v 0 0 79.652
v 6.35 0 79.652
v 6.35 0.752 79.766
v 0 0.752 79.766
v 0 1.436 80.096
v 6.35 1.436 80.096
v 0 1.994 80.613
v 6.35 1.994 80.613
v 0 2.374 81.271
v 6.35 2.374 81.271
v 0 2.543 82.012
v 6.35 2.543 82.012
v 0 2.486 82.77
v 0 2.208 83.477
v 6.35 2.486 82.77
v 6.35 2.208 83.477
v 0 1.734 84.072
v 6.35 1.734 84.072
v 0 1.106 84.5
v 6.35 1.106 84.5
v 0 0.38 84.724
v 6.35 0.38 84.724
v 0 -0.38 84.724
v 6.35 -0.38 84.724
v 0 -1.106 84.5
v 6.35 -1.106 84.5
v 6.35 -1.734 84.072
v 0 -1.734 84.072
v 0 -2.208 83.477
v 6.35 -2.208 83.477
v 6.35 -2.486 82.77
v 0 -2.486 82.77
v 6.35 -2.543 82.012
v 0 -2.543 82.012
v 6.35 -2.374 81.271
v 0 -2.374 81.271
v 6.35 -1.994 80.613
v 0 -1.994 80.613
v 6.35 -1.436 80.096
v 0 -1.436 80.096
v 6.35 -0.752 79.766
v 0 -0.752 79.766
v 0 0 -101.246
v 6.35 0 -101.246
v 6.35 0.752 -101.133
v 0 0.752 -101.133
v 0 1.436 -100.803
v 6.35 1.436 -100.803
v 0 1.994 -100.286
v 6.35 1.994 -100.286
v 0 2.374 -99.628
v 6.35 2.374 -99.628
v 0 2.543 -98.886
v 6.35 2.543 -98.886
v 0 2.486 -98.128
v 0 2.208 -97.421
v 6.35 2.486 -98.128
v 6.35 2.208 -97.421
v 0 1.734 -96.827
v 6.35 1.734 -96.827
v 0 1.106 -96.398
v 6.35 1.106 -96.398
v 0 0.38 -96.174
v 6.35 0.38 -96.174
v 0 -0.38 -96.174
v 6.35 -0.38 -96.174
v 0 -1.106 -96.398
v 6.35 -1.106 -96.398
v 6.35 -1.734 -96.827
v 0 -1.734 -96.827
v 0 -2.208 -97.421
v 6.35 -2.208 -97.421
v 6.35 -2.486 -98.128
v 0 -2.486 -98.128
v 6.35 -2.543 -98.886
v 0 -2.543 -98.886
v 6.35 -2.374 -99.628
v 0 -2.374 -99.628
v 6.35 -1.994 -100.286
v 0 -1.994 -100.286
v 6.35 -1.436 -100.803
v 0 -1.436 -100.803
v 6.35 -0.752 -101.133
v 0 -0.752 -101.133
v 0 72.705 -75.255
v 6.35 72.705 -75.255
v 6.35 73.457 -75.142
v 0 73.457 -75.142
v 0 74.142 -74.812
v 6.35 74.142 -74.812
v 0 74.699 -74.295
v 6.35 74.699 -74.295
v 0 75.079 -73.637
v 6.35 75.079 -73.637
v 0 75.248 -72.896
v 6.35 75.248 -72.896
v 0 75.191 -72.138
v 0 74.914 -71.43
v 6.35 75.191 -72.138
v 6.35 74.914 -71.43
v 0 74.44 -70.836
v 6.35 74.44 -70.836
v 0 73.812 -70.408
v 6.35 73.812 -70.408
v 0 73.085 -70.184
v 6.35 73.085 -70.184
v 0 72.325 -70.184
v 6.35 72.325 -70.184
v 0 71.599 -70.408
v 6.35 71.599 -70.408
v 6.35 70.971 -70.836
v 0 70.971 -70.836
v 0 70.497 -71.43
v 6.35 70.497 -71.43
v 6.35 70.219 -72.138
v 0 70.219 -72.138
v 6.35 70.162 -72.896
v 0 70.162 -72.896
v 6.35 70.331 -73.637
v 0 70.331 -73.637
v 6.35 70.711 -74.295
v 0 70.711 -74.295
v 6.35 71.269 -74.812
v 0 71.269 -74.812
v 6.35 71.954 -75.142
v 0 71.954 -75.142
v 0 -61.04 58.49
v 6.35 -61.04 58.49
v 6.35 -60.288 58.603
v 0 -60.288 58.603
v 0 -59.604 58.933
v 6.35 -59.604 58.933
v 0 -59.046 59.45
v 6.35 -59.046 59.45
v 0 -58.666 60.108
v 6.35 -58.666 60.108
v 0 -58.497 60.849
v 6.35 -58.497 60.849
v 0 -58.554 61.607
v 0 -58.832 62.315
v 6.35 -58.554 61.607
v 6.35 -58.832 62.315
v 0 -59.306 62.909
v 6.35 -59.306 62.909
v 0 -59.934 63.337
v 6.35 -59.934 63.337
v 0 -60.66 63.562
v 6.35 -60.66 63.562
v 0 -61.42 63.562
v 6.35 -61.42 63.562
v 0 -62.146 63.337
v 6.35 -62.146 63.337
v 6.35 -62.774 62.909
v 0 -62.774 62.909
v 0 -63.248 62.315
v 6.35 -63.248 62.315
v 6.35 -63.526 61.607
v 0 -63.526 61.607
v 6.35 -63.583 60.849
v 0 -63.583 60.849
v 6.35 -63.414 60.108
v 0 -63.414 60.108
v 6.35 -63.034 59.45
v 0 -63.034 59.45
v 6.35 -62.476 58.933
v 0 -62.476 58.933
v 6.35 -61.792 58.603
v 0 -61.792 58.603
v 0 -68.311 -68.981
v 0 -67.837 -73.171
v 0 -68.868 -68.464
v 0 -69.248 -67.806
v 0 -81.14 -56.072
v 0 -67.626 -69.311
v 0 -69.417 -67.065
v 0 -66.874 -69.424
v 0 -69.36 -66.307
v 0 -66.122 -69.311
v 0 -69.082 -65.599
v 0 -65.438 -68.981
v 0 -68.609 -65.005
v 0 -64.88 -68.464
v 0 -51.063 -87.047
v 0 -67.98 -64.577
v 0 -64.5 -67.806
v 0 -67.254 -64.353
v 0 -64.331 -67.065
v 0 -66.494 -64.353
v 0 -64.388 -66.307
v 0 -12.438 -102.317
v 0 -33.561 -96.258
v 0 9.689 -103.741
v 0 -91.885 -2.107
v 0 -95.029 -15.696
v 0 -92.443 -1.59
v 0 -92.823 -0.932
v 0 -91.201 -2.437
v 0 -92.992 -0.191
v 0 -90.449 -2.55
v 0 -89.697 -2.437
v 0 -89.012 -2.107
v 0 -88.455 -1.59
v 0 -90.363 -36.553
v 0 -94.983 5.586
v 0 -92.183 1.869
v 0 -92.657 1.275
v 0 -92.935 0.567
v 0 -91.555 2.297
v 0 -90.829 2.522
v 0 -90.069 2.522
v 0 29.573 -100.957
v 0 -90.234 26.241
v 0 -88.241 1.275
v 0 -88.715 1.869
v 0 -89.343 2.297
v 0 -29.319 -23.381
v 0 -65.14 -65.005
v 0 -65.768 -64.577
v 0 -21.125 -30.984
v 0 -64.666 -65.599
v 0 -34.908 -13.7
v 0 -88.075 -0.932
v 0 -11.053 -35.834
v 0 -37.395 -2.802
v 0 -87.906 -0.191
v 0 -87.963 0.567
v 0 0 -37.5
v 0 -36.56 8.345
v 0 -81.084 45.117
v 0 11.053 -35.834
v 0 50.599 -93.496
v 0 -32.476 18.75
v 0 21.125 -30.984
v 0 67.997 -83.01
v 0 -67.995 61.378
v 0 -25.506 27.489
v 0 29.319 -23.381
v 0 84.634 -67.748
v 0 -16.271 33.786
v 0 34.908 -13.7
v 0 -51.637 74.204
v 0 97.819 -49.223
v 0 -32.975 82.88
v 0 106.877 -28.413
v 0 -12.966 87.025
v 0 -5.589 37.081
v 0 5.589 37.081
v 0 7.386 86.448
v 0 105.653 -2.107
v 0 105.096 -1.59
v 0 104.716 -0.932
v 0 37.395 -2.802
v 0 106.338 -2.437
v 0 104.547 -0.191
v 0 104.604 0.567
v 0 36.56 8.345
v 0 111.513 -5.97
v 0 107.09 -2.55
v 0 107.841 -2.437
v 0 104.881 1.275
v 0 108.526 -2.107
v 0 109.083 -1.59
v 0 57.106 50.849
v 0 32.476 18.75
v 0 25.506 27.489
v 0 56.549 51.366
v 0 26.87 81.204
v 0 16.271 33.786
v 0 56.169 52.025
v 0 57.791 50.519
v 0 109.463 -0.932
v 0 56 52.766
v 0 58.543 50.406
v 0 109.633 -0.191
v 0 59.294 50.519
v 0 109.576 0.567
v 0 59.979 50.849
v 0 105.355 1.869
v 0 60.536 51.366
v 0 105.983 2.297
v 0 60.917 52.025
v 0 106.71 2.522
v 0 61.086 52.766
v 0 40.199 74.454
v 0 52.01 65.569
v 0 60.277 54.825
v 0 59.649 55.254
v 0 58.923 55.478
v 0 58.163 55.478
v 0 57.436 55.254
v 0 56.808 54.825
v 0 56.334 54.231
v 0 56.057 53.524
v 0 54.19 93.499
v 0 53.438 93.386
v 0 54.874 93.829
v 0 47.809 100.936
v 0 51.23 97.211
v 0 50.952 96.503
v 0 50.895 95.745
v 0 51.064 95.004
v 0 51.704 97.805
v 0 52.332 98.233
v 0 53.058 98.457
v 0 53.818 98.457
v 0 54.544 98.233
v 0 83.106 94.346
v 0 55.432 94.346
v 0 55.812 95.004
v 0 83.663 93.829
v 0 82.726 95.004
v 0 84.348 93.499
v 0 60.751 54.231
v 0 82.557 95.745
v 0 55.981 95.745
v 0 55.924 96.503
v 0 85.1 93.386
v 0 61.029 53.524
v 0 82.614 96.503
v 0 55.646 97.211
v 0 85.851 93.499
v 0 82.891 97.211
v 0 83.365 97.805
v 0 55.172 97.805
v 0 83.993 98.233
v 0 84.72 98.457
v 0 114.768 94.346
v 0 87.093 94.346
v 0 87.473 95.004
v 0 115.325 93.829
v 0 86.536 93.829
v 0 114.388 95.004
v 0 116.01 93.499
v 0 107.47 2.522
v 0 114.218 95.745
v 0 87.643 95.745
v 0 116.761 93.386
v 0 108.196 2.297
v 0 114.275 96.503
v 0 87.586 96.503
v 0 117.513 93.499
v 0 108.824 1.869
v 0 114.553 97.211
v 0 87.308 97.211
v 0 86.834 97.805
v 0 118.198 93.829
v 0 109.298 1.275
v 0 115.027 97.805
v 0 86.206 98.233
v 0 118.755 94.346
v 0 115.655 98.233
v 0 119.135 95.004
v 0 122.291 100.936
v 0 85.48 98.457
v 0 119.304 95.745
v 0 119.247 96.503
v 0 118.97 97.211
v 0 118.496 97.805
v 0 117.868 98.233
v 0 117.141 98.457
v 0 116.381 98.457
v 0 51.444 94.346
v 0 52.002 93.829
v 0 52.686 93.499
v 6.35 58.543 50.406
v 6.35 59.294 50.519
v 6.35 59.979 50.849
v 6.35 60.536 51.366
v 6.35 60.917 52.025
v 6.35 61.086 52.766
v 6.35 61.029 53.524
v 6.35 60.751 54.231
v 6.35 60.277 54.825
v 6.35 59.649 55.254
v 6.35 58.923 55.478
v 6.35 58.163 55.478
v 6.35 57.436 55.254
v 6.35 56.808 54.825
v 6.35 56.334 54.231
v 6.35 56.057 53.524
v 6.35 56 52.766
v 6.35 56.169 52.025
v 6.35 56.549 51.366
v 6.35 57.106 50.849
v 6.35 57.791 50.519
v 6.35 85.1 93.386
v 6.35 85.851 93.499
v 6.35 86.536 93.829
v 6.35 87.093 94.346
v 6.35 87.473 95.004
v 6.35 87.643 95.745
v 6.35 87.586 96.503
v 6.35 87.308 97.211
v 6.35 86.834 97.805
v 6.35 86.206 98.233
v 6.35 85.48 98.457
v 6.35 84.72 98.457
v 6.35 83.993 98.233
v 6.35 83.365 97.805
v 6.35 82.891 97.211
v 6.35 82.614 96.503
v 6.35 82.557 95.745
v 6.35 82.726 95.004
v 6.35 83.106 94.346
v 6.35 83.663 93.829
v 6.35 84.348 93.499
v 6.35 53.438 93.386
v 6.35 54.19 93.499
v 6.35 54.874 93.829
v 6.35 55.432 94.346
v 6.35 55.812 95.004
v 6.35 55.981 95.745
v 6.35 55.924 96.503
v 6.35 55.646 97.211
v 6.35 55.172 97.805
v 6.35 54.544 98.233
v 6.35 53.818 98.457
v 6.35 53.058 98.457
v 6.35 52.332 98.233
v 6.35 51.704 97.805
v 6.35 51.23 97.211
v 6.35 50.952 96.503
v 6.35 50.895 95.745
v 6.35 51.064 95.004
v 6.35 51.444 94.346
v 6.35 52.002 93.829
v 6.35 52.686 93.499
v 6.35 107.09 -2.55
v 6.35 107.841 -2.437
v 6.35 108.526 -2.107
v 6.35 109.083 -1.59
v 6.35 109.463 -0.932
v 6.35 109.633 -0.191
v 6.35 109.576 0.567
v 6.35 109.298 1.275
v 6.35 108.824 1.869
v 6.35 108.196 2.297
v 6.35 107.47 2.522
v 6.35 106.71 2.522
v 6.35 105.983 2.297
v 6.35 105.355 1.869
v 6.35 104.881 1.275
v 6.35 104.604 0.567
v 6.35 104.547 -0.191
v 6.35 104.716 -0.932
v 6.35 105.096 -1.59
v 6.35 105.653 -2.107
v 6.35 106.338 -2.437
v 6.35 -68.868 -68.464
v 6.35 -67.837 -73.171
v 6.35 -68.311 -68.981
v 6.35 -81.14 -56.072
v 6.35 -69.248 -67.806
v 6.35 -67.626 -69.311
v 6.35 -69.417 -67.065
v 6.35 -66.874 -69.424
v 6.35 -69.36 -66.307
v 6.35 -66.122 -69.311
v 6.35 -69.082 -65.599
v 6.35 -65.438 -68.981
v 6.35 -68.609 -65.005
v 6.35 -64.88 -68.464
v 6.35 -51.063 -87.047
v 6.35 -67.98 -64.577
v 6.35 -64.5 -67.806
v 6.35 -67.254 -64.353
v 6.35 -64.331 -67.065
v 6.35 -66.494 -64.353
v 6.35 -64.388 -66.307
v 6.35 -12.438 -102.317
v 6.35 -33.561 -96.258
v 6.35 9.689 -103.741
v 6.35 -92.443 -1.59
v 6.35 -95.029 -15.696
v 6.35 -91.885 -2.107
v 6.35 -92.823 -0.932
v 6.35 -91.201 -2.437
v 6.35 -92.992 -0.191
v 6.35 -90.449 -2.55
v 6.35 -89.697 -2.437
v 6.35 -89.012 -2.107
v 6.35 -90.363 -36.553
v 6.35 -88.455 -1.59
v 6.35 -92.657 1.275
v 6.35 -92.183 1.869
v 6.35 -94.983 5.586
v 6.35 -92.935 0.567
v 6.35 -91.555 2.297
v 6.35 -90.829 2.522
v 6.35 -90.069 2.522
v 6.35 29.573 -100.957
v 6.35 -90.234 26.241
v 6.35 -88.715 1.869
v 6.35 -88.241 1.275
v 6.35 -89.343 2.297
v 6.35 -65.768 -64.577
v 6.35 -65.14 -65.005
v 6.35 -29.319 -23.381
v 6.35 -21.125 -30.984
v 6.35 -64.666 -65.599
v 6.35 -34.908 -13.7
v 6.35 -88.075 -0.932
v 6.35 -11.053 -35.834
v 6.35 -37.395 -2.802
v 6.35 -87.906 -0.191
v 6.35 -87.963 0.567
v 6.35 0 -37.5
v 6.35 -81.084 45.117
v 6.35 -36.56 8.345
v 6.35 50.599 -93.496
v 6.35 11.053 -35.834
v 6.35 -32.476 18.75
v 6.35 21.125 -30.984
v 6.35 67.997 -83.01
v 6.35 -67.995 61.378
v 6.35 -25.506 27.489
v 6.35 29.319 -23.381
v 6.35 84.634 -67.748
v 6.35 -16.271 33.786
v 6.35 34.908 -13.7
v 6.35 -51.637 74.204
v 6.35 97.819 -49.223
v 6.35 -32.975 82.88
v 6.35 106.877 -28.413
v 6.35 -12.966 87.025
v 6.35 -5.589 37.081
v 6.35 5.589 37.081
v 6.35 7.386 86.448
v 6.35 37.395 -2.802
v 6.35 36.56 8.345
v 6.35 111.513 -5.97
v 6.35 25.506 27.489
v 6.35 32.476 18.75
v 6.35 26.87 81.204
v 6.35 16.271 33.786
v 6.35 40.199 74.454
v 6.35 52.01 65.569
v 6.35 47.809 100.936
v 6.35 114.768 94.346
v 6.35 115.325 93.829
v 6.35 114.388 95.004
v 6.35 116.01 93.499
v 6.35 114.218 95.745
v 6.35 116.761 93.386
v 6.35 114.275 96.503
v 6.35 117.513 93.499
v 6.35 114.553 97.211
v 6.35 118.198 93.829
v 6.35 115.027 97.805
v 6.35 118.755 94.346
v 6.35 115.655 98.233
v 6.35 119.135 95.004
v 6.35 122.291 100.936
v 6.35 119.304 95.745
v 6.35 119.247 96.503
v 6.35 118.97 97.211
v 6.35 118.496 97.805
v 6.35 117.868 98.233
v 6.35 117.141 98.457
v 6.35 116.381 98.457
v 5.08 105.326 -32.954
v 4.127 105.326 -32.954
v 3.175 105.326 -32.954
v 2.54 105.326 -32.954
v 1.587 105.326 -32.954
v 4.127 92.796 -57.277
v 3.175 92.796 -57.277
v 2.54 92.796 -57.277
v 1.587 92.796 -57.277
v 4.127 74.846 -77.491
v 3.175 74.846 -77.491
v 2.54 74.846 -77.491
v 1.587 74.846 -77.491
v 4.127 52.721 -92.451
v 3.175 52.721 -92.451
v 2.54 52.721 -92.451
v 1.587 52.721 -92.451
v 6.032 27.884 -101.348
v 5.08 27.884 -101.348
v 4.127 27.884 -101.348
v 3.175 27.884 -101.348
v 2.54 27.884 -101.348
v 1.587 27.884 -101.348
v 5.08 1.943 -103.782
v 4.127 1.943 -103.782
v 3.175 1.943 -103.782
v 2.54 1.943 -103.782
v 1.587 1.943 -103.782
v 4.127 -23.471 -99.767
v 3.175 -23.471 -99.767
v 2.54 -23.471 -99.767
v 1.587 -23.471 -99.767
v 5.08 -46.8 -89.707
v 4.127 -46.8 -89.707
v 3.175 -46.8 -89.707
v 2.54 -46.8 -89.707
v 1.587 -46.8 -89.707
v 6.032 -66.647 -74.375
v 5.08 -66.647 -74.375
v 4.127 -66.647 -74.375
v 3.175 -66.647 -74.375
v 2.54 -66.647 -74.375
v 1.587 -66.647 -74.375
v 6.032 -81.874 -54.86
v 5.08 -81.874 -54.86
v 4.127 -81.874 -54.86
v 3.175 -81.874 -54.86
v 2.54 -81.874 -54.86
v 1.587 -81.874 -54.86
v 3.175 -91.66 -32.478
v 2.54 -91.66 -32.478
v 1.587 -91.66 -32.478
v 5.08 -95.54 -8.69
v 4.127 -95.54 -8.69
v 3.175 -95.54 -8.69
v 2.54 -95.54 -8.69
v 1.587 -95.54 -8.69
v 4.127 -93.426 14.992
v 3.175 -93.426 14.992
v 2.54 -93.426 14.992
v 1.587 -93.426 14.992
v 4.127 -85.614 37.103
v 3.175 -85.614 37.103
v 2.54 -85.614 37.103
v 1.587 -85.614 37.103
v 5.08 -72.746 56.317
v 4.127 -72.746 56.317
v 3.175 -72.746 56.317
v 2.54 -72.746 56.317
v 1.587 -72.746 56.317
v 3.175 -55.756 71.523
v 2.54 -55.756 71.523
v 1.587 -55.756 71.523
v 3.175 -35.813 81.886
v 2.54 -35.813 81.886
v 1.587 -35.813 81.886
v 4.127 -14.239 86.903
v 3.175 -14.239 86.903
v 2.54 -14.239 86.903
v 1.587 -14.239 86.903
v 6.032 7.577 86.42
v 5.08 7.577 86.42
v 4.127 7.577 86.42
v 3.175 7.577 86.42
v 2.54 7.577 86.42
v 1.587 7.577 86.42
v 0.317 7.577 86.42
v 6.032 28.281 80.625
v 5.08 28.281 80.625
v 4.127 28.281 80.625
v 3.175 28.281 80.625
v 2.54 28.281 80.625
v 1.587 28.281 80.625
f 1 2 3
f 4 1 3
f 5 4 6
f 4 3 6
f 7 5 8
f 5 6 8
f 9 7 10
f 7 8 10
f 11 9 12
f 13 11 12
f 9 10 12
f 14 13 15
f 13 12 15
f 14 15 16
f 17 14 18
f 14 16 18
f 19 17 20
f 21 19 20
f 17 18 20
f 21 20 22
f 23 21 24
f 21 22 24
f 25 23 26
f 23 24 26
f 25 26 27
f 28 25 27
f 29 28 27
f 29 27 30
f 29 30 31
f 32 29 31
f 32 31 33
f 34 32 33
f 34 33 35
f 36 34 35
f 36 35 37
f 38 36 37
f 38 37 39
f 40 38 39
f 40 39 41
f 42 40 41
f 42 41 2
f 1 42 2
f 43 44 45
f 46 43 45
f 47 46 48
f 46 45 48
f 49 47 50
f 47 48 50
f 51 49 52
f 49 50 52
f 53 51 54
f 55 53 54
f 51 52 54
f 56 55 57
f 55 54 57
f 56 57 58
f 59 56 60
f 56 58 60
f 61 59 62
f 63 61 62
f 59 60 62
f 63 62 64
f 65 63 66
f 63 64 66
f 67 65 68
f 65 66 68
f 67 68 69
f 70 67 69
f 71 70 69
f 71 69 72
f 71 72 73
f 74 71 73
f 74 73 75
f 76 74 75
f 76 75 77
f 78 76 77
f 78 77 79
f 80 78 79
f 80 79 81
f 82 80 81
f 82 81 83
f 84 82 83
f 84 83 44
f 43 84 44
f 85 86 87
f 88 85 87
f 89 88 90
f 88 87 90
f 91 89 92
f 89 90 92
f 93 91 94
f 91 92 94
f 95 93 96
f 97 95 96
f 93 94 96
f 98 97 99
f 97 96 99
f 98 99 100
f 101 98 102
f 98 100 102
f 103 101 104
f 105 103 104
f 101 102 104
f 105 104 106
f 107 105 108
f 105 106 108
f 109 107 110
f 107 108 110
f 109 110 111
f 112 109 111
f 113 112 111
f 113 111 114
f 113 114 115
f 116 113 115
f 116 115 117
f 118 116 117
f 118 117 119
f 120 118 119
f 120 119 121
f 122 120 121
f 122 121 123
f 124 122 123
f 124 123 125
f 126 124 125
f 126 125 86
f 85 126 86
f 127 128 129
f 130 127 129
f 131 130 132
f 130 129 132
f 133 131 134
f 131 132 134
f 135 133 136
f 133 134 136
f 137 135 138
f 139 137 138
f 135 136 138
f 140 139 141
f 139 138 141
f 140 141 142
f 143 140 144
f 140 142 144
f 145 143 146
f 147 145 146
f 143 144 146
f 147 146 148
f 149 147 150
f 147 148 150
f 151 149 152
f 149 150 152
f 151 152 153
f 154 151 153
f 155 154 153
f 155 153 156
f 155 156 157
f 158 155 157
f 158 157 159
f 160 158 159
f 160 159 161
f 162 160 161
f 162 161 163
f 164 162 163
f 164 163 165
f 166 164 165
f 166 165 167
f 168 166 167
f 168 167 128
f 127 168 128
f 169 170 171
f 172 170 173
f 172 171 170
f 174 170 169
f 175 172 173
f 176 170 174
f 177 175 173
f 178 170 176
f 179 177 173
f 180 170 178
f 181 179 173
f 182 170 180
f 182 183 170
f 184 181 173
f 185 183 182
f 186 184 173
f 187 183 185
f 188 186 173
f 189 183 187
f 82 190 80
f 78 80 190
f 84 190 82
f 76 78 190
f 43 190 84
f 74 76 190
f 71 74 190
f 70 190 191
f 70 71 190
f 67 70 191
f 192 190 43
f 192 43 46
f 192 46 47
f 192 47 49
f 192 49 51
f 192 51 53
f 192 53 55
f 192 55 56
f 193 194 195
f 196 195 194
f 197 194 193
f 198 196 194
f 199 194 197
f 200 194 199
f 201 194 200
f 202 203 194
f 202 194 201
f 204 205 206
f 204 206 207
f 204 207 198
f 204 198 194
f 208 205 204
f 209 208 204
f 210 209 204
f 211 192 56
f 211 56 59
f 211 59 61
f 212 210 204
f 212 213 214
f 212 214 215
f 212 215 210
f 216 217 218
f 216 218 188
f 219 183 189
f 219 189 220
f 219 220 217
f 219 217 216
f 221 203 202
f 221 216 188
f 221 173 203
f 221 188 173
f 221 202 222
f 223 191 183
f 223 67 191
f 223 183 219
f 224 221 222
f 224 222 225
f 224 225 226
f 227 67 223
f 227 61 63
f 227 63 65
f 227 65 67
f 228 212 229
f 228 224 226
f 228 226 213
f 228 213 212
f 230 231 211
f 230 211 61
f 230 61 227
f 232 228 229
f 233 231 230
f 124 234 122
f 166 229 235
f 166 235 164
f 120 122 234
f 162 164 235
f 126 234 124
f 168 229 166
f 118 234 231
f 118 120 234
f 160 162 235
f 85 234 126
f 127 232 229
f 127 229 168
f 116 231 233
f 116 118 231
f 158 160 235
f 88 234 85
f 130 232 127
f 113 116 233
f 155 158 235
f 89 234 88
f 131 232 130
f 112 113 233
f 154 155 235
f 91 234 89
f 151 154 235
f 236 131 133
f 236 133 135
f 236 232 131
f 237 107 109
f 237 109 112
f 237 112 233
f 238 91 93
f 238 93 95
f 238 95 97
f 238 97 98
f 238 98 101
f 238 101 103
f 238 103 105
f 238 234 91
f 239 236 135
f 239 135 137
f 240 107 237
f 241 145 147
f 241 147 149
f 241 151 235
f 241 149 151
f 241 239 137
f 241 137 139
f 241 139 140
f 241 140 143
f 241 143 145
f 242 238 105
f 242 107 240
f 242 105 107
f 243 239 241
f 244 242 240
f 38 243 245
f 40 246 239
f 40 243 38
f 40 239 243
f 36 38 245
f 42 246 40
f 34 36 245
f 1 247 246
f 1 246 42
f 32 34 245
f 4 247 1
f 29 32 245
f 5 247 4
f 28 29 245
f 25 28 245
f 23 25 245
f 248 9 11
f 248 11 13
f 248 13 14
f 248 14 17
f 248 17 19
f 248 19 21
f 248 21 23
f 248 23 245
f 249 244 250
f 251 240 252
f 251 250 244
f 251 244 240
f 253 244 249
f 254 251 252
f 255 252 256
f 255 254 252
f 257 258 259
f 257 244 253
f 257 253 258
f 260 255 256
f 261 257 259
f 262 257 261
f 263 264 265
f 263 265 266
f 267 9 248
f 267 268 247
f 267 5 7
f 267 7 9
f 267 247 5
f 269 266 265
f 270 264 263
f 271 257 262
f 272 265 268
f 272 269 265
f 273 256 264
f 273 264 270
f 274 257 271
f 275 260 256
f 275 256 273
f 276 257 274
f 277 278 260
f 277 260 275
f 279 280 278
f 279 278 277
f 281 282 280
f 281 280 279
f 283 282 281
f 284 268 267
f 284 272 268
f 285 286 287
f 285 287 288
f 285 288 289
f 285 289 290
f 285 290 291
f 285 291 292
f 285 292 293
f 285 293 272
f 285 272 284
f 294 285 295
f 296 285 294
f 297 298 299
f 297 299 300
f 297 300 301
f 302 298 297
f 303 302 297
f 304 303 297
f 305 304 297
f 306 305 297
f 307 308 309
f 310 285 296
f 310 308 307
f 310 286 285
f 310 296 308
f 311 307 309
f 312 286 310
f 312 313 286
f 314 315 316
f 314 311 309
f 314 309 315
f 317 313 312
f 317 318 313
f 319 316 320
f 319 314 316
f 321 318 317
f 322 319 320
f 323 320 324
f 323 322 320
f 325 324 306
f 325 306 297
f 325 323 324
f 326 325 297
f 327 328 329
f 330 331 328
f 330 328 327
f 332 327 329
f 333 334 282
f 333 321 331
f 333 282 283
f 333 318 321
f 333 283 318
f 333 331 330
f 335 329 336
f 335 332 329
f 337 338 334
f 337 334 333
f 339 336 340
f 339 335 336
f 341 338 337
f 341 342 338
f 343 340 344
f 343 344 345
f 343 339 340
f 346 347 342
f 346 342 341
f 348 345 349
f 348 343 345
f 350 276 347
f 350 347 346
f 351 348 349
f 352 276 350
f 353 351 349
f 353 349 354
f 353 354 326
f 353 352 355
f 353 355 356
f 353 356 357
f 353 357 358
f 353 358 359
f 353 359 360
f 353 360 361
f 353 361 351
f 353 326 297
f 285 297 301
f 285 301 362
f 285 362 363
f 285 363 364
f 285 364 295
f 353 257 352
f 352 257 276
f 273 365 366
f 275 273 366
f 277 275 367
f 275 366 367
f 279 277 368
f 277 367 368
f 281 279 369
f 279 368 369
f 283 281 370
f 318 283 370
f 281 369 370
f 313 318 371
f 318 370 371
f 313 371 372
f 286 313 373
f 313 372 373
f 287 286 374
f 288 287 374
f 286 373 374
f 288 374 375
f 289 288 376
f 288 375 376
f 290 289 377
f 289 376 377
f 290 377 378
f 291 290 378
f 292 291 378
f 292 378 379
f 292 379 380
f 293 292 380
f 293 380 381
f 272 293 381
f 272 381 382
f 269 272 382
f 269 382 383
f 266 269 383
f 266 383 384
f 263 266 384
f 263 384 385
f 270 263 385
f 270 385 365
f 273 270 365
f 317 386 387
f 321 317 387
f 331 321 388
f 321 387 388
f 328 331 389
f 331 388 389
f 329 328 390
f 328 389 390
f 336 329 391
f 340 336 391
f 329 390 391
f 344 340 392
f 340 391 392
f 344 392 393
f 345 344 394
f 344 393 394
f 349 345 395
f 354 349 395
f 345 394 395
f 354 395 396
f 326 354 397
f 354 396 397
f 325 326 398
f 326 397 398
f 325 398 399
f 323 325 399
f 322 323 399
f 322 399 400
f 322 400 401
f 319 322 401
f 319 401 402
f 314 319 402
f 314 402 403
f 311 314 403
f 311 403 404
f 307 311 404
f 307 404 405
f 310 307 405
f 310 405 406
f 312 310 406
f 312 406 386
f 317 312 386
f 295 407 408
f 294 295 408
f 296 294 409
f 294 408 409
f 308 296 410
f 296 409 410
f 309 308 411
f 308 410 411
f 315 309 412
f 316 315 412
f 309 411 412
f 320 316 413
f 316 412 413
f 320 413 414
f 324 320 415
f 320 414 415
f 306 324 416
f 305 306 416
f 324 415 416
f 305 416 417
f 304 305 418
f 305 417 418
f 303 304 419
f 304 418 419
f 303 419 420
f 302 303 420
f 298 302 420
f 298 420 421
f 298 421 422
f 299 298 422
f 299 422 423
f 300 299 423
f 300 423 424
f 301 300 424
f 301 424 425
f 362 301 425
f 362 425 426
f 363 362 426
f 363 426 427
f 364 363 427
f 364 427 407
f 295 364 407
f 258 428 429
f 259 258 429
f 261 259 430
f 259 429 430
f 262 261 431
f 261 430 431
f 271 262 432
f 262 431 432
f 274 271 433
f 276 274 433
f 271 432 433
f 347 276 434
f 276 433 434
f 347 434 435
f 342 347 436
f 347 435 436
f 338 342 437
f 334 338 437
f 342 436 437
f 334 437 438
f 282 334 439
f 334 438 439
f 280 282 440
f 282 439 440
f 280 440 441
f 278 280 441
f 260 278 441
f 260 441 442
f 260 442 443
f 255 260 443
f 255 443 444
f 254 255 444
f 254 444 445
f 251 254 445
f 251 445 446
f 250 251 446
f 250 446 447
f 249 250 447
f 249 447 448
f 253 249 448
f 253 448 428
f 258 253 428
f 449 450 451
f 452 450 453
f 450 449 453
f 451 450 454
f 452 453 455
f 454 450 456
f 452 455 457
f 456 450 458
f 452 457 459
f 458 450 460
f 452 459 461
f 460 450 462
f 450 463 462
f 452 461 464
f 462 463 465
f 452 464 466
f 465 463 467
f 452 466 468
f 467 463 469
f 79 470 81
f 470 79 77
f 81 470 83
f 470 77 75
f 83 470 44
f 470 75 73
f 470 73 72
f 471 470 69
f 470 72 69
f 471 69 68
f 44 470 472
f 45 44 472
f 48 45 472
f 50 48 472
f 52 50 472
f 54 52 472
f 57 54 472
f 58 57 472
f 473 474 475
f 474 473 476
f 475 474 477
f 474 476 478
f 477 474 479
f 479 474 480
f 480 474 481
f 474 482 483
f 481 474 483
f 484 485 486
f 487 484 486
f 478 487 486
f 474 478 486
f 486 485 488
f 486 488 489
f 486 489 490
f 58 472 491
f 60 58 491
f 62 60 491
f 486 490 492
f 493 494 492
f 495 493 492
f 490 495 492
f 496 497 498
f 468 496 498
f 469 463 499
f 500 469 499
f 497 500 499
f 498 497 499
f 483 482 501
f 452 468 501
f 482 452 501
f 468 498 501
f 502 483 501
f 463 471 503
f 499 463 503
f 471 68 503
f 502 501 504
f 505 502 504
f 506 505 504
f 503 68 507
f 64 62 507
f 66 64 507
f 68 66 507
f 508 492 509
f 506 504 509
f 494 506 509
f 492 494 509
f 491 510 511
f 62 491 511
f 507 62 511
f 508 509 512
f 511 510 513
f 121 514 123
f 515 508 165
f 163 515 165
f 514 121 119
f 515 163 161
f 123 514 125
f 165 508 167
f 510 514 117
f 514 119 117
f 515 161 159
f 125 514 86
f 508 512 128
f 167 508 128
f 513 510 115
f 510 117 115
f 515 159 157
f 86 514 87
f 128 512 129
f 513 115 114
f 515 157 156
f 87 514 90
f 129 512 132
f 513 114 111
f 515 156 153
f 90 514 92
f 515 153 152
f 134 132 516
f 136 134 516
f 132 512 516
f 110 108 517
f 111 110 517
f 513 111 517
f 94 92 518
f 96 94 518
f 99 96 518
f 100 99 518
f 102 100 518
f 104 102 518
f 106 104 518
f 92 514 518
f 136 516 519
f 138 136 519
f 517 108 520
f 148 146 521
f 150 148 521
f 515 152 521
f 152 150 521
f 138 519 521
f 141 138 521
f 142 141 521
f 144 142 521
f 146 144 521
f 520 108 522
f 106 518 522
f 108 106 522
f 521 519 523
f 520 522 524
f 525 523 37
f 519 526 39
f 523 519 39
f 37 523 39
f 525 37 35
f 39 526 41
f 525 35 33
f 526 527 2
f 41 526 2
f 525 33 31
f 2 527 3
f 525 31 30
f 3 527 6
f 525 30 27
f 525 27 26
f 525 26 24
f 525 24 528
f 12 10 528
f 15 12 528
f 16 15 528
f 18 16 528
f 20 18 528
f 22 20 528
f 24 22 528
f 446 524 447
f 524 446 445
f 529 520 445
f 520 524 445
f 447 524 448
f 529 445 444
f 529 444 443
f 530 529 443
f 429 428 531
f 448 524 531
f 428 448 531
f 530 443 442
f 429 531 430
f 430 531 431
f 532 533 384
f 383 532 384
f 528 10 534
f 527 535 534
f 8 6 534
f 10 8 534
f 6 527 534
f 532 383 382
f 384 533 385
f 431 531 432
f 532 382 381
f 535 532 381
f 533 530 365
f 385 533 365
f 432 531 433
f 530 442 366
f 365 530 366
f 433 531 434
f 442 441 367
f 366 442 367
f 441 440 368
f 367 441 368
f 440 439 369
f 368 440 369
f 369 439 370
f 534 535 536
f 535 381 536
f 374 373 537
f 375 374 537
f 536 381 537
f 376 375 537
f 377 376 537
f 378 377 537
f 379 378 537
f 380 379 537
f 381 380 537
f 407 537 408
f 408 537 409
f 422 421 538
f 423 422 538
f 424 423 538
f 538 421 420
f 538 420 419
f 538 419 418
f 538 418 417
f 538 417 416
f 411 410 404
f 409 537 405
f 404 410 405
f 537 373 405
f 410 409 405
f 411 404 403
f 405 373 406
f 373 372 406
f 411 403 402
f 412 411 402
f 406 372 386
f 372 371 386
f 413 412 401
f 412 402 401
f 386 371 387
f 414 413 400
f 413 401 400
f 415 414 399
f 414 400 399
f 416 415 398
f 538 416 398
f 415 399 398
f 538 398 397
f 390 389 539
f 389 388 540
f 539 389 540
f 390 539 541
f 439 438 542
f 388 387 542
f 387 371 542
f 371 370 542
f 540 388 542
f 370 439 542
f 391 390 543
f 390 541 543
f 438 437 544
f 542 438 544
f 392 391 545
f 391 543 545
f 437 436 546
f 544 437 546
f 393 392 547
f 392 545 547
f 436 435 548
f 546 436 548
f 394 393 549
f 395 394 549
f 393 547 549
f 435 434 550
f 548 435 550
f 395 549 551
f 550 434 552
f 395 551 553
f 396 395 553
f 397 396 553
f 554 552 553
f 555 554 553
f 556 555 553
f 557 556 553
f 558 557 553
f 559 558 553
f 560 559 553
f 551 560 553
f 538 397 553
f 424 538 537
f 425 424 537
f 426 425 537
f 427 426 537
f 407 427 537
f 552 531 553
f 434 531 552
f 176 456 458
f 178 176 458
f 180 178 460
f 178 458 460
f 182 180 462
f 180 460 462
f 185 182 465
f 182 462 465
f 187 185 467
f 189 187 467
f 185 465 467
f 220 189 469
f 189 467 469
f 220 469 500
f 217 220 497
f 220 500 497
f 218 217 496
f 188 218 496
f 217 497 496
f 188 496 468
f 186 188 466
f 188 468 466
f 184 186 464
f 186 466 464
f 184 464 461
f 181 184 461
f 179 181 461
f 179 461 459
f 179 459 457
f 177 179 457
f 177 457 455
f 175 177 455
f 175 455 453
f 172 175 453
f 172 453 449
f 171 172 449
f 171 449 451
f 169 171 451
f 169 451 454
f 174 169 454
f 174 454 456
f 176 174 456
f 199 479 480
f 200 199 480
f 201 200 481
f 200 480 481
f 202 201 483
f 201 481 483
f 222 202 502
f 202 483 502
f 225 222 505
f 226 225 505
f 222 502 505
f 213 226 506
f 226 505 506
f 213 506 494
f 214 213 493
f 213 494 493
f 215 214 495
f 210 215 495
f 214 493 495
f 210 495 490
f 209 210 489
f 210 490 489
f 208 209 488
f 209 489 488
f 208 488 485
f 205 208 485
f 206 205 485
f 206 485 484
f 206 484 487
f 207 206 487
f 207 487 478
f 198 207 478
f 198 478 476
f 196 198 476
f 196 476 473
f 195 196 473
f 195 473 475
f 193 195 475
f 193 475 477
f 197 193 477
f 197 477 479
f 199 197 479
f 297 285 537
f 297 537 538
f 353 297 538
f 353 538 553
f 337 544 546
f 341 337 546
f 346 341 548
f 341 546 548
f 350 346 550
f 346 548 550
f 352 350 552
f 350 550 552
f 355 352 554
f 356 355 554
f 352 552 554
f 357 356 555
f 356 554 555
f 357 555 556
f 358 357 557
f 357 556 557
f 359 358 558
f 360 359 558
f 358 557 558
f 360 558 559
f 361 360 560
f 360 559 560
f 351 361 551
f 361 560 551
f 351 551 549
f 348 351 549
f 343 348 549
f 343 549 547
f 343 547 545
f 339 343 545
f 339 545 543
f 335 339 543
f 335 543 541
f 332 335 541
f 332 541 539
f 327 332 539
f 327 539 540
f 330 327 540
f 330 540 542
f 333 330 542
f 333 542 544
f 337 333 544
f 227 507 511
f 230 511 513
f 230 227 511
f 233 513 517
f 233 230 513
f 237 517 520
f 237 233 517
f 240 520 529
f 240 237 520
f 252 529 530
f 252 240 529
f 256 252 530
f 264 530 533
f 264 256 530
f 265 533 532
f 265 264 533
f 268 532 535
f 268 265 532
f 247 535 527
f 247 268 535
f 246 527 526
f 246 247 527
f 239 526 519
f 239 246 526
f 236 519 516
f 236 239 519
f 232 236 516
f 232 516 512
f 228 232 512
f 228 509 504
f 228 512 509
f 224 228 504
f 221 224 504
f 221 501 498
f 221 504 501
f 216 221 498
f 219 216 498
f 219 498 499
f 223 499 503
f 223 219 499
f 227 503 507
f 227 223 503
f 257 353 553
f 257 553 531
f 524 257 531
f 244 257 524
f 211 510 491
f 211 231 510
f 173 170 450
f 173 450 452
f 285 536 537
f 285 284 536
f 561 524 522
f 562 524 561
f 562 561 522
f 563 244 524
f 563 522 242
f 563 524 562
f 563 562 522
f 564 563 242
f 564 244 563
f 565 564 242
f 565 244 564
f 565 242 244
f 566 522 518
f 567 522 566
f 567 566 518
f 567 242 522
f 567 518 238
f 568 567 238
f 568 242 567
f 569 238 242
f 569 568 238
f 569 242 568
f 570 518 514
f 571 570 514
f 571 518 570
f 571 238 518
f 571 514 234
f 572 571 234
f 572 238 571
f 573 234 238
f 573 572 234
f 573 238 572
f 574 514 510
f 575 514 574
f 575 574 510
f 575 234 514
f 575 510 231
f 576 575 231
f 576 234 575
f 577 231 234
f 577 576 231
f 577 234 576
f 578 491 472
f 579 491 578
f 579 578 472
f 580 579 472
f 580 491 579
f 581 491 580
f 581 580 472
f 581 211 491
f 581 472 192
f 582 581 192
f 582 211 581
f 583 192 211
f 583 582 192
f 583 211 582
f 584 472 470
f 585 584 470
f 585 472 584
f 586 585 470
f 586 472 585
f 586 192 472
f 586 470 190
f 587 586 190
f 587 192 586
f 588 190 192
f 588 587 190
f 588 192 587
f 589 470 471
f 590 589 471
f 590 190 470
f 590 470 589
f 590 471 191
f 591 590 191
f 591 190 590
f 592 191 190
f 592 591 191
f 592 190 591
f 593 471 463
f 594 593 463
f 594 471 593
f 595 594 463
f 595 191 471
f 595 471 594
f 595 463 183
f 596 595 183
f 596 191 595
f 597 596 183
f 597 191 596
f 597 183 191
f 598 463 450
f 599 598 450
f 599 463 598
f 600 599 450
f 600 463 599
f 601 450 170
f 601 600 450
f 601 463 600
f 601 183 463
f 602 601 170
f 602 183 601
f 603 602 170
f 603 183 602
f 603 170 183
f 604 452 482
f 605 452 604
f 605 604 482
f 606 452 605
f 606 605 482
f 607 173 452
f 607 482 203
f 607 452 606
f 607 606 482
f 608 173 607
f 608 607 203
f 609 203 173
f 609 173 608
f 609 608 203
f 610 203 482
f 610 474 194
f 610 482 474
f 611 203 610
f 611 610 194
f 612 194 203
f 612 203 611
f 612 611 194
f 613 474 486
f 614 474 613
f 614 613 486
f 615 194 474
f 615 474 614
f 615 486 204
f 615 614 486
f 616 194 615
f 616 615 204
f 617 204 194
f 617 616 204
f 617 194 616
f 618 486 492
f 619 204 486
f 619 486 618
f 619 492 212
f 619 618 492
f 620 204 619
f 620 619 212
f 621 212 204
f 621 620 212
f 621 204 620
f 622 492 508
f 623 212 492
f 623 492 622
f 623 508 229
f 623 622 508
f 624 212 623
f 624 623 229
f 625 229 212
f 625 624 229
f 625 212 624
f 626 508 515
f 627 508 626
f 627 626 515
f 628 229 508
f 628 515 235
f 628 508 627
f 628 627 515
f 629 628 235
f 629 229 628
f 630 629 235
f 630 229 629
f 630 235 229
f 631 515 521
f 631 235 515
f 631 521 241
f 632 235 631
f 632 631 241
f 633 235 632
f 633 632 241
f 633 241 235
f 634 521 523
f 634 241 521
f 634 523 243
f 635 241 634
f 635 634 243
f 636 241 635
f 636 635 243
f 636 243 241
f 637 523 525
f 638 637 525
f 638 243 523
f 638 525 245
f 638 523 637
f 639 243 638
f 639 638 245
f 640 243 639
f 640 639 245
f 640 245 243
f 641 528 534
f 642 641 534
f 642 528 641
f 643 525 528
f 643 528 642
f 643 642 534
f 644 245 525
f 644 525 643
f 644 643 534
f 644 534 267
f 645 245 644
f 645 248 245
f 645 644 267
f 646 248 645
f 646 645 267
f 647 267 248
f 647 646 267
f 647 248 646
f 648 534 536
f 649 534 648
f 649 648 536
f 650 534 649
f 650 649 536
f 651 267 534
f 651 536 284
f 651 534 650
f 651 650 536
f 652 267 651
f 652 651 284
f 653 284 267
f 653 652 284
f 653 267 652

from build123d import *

# Parameters (mm, degrees)
BOSS_EXTRUDE1_DEPTH = 6.35
SKETCH11_R          = 2.55
CUT_EXTRUDE1_DEPTH  = 7.3500001
SKETCH12_R          = 37.5
CUT_EXTRUDE3_DEPTH  = 7.3500001


with BuildPart() as part:
    # Sketch10 → Boss-Extrude1 (new body)
    with BuildSketch(Plane(origin=(0, 0, 0), x_dir=(0, 0, -1), z_dir=(1, 0, 0))):
        with BuildLine():
            Line((-65.56933734, 52.009531221), (-100.935679824, 47.808985699))
            Line((-100.935679824, 47.808985699), (-100.935679824, 122.29075479))
            Line((-100.935679824, 122.29075479), (5.970340966, 111.513169224))
            add(Edge.make_bspline(
                [(5.970340966, 111.513169224), (9.050174513, 111.20267998), (15.195754527, 110.322198965), (27.224457069, 107.560584888), (41.672600889, 102.269141777), (57.583217011, 93.200335773), (76.34944741, 77.877389952), (94.274449289, 53.53377411), (104.843460982, 19.443777188), (103.677945005, -15.636484697), (91.289552438, -47.848309946), (69.405777179, -73.770277552), (40.739036605, -90.784845908), (8.654881454, -97.341351398), (-23.220610692, -93.091773694), (-51.414586087, -78.887047742), (-72.979776783, -56.641213756), (-85.804607758, -29.085280645), (-88.816261681, 0.571051967), (-83.191535024, 24.252063706), (-74.366432128, 41.075630131), (-68.698633198, 48.535069634), (-65.56933734, 52.009531221)],
                knots=[0.103071112, 0.103071112, 0.103071112, 0.103071112, 0.117085626, 0.13110014, 0.159129168, 0.187158196, 0.215187223, 0.271245279, 0.327303334, 0.38336139, 0.439419445, 0.495477501, 0.551535556, 0.607593612, 0.663651667, 0.719709723, 0.775767778, 0.831825834, 0.887883889, 0.943941945, 0.971970972, 1, 1, 1, 1], degree=3))
        make_face()
    extrude(amount=BOSS_EXTRUDE1_DEPTH)

    # Sketch11 → Cut-Extrude1 (cut, through all)
    with BuildSketch(Plane(origin=(6.35, 0, 0), x_dir=(0, 0, -1), z_dir=(1, 0, 0))):
        with Locations((-95.935679824, 116.761342324)):
            Circle(SKETCH11_R)
        with Locations((-95.935679824, 53.437991421)):
            Circle(SKETCH11_R)
        with Locations((-95.935679824, 85.099666873)):
            Circle(SKETCH11_R)
        with Locations((-52.956120261, 58.54277704)):
            Circle(SKETCH11_R)
        with Locations((0, -90.448962865)):
            Circle(SKETCH11_R)
        with Locations((-82.20247918, 0)):
            Circle(SKETCH11_R)
        with Locations((98.695882227, 0)):
            Circle(SKETCH11_R)
        with Locations((0, 107.089716811)):
            Circle(SKETCH11_R)
        with Locations((-61.03999449, -61.03999449)):
            Circle(SKETCH11_R)
        with Locations((66.874078846, -66.874078846)):
            Circle(SKETCH11_R)
        with Locations((72.70516699, 72.70516699)):
            Circle(SKETCH11_R)
    extrude(amount=-CUT_EXTRUDE1_DEPTH, mode=Mode.SUBTRACT)

    # Sketch12 → Cut-Extrude3 (cut, through all)
    with BuildSketch(Plane(origin=(0, 0, 0), x_dir=(0, 0, -1), z_dir=(1, 0, 0))):
        Circle(SKETCH12_R)
    extrude(amount=CUT_EXTRUDE3_DEPTH, mode=Mode.SUBTRACT)


solid = part.part
